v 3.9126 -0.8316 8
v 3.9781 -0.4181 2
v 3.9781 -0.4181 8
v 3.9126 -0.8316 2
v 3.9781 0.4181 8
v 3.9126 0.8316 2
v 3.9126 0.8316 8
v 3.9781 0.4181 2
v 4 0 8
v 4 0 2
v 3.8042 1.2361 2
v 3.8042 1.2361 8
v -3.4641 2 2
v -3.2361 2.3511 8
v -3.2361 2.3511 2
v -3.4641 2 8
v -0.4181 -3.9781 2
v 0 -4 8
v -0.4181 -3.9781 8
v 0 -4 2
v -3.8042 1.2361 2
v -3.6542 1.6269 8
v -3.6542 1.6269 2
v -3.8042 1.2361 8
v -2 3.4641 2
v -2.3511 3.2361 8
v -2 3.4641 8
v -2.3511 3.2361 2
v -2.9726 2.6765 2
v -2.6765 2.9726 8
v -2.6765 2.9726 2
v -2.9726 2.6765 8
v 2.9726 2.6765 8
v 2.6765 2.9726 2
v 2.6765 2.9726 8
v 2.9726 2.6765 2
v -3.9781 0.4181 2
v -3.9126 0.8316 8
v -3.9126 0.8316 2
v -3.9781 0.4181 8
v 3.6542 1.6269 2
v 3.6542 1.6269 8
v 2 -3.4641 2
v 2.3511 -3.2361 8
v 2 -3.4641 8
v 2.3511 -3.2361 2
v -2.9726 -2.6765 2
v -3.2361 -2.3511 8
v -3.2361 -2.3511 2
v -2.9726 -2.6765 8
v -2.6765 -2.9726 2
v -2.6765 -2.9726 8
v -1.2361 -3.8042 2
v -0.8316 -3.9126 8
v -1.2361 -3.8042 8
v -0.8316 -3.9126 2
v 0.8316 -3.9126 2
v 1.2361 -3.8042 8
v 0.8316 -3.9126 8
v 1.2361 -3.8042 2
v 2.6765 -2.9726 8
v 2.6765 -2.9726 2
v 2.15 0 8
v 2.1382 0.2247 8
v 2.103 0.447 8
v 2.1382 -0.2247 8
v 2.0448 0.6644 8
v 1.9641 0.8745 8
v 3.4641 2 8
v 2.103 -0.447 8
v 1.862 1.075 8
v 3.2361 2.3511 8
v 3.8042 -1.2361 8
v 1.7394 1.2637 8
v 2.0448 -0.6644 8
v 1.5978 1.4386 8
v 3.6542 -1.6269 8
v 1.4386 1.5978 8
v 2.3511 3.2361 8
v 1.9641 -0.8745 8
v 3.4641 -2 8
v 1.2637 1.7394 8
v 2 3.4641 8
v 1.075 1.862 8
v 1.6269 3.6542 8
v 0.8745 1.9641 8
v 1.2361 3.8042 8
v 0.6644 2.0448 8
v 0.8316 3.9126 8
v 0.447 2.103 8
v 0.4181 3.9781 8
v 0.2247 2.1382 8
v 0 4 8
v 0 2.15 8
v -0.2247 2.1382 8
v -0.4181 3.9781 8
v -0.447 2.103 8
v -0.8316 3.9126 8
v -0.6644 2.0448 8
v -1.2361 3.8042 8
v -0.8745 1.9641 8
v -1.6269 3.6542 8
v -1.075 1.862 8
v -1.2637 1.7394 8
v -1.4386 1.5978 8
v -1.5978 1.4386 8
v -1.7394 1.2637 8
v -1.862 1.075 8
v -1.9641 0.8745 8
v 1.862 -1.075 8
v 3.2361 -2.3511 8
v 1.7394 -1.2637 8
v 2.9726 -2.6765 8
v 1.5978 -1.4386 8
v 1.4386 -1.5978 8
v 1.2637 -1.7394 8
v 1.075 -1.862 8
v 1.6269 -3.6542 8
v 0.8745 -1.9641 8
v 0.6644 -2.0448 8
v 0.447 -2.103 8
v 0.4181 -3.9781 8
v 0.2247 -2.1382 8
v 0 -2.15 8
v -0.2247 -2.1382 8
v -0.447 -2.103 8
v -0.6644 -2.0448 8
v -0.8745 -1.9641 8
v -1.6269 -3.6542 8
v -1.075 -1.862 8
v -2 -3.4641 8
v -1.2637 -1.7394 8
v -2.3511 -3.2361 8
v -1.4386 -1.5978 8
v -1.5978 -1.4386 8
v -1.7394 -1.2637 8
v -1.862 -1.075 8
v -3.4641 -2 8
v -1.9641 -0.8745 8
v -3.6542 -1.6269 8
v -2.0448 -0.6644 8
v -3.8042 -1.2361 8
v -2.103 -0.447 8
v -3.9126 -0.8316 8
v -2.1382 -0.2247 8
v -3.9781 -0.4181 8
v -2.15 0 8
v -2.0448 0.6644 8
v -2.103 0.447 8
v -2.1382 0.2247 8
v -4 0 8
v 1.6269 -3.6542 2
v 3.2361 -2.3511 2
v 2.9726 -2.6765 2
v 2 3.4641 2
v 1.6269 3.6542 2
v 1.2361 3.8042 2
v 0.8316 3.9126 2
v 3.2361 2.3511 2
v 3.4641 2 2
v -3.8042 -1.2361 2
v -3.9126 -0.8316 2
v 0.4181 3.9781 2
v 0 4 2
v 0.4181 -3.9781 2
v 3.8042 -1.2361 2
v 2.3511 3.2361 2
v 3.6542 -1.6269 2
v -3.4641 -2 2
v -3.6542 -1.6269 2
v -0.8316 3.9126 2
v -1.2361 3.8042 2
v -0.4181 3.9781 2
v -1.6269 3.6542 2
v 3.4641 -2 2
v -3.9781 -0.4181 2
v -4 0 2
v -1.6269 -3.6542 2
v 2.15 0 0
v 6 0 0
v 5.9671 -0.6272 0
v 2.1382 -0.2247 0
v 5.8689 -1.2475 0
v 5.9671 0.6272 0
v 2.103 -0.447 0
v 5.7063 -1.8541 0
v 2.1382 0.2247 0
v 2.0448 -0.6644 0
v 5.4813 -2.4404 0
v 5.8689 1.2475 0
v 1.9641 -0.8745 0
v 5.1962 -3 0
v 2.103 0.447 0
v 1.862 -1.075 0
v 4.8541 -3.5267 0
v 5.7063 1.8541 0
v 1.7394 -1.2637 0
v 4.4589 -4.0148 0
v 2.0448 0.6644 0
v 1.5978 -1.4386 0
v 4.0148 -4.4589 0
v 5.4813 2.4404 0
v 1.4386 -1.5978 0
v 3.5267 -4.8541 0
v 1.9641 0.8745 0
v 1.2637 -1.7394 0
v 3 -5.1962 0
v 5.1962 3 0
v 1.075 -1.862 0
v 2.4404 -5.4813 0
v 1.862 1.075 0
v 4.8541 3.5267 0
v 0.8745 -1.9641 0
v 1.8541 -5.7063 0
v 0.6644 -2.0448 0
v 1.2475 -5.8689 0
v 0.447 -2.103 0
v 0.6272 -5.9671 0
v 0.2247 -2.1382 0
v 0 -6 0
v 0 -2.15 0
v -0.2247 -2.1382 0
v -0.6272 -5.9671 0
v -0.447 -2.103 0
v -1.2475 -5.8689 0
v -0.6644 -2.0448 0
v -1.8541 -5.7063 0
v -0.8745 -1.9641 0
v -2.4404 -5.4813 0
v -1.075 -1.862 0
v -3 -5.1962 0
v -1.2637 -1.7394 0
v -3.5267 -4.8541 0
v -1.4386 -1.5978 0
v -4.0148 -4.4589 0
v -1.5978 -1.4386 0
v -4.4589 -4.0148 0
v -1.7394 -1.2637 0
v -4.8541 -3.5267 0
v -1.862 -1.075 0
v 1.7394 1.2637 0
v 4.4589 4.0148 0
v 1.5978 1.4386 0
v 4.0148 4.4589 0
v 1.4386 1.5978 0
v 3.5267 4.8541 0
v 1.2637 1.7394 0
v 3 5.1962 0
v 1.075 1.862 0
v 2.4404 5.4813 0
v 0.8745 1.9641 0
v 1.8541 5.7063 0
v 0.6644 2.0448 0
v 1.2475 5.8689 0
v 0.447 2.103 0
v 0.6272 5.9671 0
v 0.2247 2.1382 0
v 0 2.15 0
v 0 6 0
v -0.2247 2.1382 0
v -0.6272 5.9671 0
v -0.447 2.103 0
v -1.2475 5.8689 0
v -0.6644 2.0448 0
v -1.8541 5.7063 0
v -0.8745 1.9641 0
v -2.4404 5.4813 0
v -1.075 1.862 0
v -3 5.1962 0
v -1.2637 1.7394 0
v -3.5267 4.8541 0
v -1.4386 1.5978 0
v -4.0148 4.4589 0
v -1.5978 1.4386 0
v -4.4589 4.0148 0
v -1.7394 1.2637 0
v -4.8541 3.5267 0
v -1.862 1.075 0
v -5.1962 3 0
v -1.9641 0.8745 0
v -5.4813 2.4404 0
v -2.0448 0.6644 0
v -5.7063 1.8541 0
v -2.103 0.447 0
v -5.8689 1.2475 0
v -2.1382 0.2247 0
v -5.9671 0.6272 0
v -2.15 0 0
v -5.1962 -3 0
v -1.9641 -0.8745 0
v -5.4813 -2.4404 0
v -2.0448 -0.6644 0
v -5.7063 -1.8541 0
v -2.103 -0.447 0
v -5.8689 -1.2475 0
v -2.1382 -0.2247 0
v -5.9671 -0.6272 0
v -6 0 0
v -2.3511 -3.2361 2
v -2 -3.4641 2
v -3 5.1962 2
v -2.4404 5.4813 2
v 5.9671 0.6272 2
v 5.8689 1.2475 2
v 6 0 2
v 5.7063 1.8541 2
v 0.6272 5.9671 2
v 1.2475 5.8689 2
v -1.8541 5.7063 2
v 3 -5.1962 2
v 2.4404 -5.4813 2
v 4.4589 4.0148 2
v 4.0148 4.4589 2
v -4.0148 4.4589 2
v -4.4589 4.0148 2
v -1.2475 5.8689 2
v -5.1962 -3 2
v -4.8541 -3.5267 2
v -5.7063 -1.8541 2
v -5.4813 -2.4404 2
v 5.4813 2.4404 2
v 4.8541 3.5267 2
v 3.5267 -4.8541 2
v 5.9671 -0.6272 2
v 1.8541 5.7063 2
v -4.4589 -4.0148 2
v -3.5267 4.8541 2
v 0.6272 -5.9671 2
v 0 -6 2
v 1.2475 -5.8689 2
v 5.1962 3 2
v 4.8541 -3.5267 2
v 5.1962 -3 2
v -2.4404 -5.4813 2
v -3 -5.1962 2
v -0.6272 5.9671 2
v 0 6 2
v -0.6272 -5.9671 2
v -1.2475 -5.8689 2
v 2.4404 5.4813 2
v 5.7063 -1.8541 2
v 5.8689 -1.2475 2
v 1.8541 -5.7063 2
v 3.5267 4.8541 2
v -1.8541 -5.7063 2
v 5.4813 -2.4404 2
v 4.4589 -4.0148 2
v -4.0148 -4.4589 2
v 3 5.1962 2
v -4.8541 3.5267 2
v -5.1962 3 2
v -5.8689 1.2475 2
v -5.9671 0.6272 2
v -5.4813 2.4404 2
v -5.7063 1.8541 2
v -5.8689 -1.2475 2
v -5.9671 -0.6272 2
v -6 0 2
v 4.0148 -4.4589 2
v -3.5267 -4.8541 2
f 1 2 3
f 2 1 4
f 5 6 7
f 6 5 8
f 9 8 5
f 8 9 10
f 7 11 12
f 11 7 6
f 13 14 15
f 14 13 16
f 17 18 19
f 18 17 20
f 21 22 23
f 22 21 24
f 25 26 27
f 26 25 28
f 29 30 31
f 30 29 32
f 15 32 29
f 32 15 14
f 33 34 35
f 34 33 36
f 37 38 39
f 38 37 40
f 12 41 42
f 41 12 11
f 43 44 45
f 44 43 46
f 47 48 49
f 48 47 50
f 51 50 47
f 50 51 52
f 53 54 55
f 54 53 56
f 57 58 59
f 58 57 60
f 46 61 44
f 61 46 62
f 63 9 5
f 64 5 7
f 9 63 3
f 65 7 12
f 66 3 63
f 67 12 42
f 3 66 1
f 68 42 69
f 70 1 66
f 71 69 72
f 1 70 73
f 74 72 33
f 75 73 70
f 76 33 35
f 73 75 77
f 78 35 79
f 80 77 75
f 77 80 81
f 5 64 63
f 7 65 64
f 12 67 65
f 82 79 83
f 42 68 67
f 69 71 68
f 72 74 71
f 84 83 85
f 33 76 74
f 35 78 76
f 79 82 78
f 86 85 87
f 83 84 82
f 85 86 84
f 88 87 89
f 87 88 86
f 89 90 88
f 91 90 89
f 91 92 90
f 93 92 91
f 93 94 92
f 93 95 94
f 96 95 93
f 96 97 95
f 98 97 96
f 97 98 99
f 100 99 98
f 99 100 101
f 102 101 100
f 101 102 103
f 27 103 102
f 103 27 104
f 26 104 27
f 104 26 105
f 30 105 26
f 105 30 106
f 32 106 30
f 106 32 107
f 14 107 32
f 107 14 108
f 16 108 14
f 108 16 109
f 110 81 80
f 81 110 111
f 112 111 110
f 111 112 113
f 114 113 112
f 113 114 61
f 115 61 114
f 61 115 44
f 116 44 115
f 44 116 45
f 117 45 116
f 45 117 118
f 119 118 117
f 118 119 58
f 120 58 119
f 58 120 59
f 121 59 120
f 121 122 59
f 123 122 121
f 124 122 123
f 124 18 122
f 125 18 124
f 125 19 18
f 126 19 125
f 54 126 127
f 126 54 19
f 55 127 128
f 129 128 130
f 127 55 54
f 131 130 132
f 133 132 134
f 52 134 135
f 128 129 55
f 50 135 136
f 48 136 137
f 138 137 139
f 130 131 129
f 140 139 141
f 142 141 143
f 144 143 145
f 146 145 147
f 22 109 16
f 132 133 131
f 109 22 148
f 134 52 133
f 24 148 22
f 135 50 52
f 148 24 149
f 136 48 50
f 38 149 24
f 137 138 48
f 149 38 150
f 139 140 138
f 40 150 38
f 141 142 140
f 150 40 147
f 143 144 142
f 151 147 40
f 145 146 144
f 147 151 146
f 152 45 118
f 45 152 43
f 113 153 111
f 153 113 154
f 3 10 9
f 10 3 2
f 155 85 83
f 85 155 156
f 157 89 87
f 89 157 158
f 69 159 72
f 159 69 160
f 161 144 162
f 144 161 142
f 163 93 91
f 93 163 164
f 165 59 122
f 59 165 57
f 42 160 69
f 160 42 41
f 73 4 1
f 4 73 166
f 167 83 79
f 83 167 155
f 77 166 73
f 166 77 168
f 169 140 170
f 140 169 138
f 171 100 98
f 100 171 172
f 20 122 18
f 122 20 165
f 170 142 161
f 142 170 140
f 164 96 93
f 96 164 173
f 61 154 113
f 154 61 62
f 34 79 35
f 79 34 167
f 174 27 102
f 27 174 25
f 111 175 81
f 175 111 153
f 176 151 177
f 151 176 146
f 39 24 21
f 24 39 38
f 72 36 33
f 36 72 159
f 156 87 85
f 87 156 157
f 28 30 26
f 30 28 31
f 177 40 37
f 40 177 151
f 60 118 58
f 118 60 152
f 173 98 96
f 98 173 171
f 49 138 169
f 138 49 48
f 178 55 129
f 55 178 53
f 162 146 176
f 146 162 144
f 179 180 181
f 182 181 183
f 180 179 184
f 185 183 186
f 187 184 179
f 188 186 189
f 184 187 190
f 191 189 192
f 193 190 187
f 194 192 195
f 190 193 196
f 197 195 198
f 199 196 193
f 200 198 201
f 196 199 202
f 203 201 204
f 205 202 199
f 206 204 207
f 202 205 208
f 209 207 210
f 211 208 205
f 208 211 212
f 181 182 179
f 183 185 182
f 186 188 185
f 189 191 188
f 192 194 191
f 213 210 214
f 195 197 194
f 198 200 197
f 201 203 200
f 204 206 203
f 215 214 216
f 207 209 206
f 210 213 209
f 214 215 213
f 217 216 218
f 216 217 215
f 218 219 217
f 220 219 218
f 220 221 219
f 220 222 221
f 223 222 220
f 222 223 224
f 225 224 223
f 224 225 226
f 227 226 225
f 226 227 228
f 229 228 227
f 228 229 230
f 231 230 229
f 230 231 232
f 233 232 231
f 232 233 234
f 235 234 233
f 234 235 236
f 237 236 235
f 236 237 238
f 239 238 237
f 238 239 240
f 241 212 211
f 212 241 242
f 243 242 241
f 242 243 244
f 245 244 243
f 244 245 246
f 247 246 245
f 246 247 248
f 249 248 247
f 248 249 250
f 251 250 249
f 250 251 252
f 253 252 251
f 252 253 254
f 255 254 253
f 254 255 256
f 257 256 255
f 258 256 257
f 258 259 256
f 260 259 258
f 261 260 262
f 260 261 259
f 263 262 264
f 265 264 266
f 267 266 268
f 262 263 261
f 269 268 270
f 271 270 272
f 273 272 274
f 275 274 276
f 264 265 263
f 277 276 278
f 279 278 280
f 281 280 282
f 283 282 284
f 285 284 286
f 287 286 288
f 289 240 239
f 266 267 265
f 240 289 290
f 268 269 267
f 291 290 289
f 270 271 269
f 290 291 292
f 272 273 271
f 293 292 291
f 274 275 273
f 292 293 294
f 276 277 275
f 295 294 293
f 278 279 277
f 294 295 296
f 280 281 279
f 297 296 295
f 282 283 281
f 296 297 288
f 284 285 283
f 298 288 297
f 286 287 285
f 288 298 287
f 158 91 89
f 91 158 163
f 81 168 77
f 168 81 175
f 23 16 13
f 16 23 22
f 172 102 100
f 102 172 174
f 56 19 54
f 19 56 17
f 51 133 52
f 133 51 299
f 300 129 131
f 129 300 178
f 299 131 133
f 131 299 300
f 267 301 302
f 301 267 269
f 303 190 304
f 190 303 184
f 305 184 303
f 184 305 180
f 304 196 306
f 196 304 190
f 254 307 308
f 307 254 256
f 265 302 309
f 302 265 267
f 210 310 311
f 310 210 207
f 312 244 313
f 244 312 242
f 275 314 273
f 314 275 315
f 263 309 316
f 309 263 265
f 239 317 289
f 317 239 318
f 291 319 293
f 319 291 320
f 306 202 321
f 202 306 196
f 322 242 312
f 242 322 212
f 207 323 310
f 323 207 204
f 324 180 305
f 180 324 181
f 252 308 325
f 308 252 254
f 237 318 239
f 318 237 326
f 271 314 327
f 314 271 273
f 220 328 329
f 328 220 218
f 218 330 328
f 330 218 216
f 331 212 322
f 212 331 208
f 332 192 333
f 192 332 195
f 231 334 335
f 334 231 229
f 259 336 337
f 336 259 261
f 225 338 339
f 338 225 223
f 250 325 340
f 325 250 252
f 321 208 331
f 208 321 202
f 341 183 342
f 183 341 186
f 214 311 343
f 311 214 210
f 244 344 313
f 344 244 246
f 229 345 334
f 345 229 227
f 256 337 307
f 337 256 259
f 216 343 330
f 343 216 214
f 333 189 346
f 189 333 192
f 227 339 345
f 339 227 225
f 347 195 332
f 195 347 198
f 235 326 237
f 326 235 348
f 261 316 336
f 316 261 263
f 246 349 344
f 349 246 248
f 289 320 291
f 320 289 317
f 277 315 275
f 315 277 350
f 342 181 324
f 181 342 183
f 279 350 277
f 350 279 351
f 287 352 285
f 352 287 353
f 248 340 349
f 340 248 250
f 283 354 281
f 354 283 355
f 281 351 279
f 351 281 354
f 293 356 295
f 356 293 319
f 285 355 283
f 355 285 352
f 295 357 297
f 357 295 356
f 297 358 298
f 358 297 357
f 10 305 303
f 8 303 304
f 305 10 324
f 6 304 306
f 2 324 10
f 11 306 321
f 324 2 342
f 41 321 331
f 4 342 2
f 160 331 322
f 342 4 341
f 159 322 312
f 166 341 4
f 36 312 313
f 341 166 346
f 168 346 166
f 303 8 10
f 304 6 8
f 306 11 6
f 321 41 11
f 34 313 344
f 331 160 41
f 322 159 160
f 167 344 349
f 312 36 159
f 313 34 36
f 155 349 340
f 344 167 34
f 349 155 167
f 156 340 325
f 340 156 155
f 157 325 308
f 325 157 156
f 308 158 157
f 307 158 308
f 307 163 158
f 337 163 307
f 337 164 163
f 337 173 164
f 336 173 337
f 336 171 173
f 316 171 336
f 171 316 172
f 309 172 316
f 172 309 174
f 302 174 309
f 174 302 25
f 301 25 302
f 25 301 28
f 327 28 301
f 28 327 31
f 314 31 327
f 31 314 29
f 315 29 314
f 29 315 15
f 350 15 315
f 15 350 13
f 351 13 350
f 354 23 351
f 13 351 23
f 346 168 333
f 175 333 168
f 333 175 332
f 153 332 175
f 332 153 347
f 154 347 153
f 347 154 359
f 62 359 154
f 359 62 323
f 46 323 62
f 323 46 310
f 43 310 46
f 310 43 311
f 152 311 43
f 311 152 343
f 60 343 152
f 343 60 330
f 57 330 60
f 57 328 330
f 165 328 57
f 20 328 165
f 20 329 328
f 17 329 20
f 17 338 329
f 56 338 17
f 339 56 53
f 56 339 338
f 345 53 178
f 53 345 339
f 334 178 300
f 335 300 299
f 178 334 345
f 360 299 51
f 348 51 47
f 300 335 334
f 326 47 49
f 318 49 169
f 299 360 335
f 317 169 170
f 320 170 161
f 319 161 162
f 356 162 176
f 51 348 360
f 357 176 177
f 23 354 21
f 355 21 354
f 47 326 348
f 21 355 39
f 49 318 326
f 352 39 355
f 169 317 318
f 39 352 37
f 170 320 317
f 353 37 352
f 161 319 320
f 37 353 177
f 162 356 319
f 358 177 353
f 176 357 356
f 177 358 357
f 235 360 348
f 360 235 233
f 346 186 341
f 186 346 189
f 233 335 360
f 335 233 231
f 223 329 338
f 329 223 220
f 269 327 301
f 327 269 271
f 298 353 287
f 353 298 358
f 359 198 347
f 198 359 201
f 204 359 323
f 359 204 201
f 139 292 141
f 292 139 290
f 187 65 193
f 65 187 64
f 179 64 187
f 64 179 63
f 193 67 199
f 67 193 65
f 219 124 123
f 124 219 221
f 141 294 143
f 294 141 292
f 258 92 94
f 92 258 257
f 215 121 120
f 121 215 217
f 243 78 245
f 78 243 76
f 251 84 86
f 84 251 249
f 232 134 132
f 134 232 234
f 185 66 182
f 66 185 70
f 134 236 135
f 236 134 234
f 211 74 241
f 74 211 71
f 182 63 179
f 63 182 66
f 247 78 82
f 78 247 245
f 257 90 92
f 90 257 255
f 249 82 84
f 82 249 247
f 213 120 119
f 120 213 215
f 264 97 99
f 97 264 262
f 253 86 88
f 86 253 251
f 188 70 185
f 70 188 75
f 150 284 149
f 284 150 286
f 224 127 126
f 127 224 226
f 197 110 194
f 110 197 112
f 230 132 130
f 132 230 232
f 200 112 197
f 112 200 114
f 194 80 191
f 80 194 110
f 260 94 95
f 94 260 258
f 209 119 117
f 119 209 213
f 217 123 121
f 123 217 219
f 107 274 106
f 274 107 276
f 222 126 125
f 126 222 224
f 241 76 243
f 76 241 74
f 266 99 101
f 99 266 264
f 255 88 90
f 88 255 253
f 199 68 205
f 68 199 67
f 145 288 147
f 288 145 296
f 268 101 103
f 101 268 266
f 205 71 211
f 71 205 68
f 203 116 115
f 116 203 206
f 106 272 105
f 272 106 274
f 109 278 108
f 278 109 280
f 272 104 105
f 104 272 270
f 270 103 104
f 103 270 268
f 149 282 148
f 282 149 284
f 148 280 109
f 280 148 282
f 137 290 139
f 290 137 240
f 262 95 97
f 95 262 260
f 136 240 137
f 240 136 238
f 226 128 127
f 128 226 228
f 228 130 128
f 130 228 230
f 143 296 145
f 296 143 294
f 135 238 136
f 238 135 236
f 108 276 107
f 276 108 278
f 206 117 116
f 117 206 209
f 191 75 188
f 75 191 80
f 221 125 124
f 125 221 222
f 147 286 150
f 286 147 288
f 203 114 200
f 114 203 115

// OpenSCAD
// Rivet nut / nutsert.
$fn = 60;
eps = 0.02;
thread_d = 4.3;
outer_d = 8;
length = 8;
flange_d = 12;
difference() { union() { cylinder(d=max(outer_d, thread_d+3),h=length); cylinder(d=max(flange_d, thread_d+6),h=2); } translate([0,0,-eps]) cylinder(d=thread_d,h=length+2*eps); }
